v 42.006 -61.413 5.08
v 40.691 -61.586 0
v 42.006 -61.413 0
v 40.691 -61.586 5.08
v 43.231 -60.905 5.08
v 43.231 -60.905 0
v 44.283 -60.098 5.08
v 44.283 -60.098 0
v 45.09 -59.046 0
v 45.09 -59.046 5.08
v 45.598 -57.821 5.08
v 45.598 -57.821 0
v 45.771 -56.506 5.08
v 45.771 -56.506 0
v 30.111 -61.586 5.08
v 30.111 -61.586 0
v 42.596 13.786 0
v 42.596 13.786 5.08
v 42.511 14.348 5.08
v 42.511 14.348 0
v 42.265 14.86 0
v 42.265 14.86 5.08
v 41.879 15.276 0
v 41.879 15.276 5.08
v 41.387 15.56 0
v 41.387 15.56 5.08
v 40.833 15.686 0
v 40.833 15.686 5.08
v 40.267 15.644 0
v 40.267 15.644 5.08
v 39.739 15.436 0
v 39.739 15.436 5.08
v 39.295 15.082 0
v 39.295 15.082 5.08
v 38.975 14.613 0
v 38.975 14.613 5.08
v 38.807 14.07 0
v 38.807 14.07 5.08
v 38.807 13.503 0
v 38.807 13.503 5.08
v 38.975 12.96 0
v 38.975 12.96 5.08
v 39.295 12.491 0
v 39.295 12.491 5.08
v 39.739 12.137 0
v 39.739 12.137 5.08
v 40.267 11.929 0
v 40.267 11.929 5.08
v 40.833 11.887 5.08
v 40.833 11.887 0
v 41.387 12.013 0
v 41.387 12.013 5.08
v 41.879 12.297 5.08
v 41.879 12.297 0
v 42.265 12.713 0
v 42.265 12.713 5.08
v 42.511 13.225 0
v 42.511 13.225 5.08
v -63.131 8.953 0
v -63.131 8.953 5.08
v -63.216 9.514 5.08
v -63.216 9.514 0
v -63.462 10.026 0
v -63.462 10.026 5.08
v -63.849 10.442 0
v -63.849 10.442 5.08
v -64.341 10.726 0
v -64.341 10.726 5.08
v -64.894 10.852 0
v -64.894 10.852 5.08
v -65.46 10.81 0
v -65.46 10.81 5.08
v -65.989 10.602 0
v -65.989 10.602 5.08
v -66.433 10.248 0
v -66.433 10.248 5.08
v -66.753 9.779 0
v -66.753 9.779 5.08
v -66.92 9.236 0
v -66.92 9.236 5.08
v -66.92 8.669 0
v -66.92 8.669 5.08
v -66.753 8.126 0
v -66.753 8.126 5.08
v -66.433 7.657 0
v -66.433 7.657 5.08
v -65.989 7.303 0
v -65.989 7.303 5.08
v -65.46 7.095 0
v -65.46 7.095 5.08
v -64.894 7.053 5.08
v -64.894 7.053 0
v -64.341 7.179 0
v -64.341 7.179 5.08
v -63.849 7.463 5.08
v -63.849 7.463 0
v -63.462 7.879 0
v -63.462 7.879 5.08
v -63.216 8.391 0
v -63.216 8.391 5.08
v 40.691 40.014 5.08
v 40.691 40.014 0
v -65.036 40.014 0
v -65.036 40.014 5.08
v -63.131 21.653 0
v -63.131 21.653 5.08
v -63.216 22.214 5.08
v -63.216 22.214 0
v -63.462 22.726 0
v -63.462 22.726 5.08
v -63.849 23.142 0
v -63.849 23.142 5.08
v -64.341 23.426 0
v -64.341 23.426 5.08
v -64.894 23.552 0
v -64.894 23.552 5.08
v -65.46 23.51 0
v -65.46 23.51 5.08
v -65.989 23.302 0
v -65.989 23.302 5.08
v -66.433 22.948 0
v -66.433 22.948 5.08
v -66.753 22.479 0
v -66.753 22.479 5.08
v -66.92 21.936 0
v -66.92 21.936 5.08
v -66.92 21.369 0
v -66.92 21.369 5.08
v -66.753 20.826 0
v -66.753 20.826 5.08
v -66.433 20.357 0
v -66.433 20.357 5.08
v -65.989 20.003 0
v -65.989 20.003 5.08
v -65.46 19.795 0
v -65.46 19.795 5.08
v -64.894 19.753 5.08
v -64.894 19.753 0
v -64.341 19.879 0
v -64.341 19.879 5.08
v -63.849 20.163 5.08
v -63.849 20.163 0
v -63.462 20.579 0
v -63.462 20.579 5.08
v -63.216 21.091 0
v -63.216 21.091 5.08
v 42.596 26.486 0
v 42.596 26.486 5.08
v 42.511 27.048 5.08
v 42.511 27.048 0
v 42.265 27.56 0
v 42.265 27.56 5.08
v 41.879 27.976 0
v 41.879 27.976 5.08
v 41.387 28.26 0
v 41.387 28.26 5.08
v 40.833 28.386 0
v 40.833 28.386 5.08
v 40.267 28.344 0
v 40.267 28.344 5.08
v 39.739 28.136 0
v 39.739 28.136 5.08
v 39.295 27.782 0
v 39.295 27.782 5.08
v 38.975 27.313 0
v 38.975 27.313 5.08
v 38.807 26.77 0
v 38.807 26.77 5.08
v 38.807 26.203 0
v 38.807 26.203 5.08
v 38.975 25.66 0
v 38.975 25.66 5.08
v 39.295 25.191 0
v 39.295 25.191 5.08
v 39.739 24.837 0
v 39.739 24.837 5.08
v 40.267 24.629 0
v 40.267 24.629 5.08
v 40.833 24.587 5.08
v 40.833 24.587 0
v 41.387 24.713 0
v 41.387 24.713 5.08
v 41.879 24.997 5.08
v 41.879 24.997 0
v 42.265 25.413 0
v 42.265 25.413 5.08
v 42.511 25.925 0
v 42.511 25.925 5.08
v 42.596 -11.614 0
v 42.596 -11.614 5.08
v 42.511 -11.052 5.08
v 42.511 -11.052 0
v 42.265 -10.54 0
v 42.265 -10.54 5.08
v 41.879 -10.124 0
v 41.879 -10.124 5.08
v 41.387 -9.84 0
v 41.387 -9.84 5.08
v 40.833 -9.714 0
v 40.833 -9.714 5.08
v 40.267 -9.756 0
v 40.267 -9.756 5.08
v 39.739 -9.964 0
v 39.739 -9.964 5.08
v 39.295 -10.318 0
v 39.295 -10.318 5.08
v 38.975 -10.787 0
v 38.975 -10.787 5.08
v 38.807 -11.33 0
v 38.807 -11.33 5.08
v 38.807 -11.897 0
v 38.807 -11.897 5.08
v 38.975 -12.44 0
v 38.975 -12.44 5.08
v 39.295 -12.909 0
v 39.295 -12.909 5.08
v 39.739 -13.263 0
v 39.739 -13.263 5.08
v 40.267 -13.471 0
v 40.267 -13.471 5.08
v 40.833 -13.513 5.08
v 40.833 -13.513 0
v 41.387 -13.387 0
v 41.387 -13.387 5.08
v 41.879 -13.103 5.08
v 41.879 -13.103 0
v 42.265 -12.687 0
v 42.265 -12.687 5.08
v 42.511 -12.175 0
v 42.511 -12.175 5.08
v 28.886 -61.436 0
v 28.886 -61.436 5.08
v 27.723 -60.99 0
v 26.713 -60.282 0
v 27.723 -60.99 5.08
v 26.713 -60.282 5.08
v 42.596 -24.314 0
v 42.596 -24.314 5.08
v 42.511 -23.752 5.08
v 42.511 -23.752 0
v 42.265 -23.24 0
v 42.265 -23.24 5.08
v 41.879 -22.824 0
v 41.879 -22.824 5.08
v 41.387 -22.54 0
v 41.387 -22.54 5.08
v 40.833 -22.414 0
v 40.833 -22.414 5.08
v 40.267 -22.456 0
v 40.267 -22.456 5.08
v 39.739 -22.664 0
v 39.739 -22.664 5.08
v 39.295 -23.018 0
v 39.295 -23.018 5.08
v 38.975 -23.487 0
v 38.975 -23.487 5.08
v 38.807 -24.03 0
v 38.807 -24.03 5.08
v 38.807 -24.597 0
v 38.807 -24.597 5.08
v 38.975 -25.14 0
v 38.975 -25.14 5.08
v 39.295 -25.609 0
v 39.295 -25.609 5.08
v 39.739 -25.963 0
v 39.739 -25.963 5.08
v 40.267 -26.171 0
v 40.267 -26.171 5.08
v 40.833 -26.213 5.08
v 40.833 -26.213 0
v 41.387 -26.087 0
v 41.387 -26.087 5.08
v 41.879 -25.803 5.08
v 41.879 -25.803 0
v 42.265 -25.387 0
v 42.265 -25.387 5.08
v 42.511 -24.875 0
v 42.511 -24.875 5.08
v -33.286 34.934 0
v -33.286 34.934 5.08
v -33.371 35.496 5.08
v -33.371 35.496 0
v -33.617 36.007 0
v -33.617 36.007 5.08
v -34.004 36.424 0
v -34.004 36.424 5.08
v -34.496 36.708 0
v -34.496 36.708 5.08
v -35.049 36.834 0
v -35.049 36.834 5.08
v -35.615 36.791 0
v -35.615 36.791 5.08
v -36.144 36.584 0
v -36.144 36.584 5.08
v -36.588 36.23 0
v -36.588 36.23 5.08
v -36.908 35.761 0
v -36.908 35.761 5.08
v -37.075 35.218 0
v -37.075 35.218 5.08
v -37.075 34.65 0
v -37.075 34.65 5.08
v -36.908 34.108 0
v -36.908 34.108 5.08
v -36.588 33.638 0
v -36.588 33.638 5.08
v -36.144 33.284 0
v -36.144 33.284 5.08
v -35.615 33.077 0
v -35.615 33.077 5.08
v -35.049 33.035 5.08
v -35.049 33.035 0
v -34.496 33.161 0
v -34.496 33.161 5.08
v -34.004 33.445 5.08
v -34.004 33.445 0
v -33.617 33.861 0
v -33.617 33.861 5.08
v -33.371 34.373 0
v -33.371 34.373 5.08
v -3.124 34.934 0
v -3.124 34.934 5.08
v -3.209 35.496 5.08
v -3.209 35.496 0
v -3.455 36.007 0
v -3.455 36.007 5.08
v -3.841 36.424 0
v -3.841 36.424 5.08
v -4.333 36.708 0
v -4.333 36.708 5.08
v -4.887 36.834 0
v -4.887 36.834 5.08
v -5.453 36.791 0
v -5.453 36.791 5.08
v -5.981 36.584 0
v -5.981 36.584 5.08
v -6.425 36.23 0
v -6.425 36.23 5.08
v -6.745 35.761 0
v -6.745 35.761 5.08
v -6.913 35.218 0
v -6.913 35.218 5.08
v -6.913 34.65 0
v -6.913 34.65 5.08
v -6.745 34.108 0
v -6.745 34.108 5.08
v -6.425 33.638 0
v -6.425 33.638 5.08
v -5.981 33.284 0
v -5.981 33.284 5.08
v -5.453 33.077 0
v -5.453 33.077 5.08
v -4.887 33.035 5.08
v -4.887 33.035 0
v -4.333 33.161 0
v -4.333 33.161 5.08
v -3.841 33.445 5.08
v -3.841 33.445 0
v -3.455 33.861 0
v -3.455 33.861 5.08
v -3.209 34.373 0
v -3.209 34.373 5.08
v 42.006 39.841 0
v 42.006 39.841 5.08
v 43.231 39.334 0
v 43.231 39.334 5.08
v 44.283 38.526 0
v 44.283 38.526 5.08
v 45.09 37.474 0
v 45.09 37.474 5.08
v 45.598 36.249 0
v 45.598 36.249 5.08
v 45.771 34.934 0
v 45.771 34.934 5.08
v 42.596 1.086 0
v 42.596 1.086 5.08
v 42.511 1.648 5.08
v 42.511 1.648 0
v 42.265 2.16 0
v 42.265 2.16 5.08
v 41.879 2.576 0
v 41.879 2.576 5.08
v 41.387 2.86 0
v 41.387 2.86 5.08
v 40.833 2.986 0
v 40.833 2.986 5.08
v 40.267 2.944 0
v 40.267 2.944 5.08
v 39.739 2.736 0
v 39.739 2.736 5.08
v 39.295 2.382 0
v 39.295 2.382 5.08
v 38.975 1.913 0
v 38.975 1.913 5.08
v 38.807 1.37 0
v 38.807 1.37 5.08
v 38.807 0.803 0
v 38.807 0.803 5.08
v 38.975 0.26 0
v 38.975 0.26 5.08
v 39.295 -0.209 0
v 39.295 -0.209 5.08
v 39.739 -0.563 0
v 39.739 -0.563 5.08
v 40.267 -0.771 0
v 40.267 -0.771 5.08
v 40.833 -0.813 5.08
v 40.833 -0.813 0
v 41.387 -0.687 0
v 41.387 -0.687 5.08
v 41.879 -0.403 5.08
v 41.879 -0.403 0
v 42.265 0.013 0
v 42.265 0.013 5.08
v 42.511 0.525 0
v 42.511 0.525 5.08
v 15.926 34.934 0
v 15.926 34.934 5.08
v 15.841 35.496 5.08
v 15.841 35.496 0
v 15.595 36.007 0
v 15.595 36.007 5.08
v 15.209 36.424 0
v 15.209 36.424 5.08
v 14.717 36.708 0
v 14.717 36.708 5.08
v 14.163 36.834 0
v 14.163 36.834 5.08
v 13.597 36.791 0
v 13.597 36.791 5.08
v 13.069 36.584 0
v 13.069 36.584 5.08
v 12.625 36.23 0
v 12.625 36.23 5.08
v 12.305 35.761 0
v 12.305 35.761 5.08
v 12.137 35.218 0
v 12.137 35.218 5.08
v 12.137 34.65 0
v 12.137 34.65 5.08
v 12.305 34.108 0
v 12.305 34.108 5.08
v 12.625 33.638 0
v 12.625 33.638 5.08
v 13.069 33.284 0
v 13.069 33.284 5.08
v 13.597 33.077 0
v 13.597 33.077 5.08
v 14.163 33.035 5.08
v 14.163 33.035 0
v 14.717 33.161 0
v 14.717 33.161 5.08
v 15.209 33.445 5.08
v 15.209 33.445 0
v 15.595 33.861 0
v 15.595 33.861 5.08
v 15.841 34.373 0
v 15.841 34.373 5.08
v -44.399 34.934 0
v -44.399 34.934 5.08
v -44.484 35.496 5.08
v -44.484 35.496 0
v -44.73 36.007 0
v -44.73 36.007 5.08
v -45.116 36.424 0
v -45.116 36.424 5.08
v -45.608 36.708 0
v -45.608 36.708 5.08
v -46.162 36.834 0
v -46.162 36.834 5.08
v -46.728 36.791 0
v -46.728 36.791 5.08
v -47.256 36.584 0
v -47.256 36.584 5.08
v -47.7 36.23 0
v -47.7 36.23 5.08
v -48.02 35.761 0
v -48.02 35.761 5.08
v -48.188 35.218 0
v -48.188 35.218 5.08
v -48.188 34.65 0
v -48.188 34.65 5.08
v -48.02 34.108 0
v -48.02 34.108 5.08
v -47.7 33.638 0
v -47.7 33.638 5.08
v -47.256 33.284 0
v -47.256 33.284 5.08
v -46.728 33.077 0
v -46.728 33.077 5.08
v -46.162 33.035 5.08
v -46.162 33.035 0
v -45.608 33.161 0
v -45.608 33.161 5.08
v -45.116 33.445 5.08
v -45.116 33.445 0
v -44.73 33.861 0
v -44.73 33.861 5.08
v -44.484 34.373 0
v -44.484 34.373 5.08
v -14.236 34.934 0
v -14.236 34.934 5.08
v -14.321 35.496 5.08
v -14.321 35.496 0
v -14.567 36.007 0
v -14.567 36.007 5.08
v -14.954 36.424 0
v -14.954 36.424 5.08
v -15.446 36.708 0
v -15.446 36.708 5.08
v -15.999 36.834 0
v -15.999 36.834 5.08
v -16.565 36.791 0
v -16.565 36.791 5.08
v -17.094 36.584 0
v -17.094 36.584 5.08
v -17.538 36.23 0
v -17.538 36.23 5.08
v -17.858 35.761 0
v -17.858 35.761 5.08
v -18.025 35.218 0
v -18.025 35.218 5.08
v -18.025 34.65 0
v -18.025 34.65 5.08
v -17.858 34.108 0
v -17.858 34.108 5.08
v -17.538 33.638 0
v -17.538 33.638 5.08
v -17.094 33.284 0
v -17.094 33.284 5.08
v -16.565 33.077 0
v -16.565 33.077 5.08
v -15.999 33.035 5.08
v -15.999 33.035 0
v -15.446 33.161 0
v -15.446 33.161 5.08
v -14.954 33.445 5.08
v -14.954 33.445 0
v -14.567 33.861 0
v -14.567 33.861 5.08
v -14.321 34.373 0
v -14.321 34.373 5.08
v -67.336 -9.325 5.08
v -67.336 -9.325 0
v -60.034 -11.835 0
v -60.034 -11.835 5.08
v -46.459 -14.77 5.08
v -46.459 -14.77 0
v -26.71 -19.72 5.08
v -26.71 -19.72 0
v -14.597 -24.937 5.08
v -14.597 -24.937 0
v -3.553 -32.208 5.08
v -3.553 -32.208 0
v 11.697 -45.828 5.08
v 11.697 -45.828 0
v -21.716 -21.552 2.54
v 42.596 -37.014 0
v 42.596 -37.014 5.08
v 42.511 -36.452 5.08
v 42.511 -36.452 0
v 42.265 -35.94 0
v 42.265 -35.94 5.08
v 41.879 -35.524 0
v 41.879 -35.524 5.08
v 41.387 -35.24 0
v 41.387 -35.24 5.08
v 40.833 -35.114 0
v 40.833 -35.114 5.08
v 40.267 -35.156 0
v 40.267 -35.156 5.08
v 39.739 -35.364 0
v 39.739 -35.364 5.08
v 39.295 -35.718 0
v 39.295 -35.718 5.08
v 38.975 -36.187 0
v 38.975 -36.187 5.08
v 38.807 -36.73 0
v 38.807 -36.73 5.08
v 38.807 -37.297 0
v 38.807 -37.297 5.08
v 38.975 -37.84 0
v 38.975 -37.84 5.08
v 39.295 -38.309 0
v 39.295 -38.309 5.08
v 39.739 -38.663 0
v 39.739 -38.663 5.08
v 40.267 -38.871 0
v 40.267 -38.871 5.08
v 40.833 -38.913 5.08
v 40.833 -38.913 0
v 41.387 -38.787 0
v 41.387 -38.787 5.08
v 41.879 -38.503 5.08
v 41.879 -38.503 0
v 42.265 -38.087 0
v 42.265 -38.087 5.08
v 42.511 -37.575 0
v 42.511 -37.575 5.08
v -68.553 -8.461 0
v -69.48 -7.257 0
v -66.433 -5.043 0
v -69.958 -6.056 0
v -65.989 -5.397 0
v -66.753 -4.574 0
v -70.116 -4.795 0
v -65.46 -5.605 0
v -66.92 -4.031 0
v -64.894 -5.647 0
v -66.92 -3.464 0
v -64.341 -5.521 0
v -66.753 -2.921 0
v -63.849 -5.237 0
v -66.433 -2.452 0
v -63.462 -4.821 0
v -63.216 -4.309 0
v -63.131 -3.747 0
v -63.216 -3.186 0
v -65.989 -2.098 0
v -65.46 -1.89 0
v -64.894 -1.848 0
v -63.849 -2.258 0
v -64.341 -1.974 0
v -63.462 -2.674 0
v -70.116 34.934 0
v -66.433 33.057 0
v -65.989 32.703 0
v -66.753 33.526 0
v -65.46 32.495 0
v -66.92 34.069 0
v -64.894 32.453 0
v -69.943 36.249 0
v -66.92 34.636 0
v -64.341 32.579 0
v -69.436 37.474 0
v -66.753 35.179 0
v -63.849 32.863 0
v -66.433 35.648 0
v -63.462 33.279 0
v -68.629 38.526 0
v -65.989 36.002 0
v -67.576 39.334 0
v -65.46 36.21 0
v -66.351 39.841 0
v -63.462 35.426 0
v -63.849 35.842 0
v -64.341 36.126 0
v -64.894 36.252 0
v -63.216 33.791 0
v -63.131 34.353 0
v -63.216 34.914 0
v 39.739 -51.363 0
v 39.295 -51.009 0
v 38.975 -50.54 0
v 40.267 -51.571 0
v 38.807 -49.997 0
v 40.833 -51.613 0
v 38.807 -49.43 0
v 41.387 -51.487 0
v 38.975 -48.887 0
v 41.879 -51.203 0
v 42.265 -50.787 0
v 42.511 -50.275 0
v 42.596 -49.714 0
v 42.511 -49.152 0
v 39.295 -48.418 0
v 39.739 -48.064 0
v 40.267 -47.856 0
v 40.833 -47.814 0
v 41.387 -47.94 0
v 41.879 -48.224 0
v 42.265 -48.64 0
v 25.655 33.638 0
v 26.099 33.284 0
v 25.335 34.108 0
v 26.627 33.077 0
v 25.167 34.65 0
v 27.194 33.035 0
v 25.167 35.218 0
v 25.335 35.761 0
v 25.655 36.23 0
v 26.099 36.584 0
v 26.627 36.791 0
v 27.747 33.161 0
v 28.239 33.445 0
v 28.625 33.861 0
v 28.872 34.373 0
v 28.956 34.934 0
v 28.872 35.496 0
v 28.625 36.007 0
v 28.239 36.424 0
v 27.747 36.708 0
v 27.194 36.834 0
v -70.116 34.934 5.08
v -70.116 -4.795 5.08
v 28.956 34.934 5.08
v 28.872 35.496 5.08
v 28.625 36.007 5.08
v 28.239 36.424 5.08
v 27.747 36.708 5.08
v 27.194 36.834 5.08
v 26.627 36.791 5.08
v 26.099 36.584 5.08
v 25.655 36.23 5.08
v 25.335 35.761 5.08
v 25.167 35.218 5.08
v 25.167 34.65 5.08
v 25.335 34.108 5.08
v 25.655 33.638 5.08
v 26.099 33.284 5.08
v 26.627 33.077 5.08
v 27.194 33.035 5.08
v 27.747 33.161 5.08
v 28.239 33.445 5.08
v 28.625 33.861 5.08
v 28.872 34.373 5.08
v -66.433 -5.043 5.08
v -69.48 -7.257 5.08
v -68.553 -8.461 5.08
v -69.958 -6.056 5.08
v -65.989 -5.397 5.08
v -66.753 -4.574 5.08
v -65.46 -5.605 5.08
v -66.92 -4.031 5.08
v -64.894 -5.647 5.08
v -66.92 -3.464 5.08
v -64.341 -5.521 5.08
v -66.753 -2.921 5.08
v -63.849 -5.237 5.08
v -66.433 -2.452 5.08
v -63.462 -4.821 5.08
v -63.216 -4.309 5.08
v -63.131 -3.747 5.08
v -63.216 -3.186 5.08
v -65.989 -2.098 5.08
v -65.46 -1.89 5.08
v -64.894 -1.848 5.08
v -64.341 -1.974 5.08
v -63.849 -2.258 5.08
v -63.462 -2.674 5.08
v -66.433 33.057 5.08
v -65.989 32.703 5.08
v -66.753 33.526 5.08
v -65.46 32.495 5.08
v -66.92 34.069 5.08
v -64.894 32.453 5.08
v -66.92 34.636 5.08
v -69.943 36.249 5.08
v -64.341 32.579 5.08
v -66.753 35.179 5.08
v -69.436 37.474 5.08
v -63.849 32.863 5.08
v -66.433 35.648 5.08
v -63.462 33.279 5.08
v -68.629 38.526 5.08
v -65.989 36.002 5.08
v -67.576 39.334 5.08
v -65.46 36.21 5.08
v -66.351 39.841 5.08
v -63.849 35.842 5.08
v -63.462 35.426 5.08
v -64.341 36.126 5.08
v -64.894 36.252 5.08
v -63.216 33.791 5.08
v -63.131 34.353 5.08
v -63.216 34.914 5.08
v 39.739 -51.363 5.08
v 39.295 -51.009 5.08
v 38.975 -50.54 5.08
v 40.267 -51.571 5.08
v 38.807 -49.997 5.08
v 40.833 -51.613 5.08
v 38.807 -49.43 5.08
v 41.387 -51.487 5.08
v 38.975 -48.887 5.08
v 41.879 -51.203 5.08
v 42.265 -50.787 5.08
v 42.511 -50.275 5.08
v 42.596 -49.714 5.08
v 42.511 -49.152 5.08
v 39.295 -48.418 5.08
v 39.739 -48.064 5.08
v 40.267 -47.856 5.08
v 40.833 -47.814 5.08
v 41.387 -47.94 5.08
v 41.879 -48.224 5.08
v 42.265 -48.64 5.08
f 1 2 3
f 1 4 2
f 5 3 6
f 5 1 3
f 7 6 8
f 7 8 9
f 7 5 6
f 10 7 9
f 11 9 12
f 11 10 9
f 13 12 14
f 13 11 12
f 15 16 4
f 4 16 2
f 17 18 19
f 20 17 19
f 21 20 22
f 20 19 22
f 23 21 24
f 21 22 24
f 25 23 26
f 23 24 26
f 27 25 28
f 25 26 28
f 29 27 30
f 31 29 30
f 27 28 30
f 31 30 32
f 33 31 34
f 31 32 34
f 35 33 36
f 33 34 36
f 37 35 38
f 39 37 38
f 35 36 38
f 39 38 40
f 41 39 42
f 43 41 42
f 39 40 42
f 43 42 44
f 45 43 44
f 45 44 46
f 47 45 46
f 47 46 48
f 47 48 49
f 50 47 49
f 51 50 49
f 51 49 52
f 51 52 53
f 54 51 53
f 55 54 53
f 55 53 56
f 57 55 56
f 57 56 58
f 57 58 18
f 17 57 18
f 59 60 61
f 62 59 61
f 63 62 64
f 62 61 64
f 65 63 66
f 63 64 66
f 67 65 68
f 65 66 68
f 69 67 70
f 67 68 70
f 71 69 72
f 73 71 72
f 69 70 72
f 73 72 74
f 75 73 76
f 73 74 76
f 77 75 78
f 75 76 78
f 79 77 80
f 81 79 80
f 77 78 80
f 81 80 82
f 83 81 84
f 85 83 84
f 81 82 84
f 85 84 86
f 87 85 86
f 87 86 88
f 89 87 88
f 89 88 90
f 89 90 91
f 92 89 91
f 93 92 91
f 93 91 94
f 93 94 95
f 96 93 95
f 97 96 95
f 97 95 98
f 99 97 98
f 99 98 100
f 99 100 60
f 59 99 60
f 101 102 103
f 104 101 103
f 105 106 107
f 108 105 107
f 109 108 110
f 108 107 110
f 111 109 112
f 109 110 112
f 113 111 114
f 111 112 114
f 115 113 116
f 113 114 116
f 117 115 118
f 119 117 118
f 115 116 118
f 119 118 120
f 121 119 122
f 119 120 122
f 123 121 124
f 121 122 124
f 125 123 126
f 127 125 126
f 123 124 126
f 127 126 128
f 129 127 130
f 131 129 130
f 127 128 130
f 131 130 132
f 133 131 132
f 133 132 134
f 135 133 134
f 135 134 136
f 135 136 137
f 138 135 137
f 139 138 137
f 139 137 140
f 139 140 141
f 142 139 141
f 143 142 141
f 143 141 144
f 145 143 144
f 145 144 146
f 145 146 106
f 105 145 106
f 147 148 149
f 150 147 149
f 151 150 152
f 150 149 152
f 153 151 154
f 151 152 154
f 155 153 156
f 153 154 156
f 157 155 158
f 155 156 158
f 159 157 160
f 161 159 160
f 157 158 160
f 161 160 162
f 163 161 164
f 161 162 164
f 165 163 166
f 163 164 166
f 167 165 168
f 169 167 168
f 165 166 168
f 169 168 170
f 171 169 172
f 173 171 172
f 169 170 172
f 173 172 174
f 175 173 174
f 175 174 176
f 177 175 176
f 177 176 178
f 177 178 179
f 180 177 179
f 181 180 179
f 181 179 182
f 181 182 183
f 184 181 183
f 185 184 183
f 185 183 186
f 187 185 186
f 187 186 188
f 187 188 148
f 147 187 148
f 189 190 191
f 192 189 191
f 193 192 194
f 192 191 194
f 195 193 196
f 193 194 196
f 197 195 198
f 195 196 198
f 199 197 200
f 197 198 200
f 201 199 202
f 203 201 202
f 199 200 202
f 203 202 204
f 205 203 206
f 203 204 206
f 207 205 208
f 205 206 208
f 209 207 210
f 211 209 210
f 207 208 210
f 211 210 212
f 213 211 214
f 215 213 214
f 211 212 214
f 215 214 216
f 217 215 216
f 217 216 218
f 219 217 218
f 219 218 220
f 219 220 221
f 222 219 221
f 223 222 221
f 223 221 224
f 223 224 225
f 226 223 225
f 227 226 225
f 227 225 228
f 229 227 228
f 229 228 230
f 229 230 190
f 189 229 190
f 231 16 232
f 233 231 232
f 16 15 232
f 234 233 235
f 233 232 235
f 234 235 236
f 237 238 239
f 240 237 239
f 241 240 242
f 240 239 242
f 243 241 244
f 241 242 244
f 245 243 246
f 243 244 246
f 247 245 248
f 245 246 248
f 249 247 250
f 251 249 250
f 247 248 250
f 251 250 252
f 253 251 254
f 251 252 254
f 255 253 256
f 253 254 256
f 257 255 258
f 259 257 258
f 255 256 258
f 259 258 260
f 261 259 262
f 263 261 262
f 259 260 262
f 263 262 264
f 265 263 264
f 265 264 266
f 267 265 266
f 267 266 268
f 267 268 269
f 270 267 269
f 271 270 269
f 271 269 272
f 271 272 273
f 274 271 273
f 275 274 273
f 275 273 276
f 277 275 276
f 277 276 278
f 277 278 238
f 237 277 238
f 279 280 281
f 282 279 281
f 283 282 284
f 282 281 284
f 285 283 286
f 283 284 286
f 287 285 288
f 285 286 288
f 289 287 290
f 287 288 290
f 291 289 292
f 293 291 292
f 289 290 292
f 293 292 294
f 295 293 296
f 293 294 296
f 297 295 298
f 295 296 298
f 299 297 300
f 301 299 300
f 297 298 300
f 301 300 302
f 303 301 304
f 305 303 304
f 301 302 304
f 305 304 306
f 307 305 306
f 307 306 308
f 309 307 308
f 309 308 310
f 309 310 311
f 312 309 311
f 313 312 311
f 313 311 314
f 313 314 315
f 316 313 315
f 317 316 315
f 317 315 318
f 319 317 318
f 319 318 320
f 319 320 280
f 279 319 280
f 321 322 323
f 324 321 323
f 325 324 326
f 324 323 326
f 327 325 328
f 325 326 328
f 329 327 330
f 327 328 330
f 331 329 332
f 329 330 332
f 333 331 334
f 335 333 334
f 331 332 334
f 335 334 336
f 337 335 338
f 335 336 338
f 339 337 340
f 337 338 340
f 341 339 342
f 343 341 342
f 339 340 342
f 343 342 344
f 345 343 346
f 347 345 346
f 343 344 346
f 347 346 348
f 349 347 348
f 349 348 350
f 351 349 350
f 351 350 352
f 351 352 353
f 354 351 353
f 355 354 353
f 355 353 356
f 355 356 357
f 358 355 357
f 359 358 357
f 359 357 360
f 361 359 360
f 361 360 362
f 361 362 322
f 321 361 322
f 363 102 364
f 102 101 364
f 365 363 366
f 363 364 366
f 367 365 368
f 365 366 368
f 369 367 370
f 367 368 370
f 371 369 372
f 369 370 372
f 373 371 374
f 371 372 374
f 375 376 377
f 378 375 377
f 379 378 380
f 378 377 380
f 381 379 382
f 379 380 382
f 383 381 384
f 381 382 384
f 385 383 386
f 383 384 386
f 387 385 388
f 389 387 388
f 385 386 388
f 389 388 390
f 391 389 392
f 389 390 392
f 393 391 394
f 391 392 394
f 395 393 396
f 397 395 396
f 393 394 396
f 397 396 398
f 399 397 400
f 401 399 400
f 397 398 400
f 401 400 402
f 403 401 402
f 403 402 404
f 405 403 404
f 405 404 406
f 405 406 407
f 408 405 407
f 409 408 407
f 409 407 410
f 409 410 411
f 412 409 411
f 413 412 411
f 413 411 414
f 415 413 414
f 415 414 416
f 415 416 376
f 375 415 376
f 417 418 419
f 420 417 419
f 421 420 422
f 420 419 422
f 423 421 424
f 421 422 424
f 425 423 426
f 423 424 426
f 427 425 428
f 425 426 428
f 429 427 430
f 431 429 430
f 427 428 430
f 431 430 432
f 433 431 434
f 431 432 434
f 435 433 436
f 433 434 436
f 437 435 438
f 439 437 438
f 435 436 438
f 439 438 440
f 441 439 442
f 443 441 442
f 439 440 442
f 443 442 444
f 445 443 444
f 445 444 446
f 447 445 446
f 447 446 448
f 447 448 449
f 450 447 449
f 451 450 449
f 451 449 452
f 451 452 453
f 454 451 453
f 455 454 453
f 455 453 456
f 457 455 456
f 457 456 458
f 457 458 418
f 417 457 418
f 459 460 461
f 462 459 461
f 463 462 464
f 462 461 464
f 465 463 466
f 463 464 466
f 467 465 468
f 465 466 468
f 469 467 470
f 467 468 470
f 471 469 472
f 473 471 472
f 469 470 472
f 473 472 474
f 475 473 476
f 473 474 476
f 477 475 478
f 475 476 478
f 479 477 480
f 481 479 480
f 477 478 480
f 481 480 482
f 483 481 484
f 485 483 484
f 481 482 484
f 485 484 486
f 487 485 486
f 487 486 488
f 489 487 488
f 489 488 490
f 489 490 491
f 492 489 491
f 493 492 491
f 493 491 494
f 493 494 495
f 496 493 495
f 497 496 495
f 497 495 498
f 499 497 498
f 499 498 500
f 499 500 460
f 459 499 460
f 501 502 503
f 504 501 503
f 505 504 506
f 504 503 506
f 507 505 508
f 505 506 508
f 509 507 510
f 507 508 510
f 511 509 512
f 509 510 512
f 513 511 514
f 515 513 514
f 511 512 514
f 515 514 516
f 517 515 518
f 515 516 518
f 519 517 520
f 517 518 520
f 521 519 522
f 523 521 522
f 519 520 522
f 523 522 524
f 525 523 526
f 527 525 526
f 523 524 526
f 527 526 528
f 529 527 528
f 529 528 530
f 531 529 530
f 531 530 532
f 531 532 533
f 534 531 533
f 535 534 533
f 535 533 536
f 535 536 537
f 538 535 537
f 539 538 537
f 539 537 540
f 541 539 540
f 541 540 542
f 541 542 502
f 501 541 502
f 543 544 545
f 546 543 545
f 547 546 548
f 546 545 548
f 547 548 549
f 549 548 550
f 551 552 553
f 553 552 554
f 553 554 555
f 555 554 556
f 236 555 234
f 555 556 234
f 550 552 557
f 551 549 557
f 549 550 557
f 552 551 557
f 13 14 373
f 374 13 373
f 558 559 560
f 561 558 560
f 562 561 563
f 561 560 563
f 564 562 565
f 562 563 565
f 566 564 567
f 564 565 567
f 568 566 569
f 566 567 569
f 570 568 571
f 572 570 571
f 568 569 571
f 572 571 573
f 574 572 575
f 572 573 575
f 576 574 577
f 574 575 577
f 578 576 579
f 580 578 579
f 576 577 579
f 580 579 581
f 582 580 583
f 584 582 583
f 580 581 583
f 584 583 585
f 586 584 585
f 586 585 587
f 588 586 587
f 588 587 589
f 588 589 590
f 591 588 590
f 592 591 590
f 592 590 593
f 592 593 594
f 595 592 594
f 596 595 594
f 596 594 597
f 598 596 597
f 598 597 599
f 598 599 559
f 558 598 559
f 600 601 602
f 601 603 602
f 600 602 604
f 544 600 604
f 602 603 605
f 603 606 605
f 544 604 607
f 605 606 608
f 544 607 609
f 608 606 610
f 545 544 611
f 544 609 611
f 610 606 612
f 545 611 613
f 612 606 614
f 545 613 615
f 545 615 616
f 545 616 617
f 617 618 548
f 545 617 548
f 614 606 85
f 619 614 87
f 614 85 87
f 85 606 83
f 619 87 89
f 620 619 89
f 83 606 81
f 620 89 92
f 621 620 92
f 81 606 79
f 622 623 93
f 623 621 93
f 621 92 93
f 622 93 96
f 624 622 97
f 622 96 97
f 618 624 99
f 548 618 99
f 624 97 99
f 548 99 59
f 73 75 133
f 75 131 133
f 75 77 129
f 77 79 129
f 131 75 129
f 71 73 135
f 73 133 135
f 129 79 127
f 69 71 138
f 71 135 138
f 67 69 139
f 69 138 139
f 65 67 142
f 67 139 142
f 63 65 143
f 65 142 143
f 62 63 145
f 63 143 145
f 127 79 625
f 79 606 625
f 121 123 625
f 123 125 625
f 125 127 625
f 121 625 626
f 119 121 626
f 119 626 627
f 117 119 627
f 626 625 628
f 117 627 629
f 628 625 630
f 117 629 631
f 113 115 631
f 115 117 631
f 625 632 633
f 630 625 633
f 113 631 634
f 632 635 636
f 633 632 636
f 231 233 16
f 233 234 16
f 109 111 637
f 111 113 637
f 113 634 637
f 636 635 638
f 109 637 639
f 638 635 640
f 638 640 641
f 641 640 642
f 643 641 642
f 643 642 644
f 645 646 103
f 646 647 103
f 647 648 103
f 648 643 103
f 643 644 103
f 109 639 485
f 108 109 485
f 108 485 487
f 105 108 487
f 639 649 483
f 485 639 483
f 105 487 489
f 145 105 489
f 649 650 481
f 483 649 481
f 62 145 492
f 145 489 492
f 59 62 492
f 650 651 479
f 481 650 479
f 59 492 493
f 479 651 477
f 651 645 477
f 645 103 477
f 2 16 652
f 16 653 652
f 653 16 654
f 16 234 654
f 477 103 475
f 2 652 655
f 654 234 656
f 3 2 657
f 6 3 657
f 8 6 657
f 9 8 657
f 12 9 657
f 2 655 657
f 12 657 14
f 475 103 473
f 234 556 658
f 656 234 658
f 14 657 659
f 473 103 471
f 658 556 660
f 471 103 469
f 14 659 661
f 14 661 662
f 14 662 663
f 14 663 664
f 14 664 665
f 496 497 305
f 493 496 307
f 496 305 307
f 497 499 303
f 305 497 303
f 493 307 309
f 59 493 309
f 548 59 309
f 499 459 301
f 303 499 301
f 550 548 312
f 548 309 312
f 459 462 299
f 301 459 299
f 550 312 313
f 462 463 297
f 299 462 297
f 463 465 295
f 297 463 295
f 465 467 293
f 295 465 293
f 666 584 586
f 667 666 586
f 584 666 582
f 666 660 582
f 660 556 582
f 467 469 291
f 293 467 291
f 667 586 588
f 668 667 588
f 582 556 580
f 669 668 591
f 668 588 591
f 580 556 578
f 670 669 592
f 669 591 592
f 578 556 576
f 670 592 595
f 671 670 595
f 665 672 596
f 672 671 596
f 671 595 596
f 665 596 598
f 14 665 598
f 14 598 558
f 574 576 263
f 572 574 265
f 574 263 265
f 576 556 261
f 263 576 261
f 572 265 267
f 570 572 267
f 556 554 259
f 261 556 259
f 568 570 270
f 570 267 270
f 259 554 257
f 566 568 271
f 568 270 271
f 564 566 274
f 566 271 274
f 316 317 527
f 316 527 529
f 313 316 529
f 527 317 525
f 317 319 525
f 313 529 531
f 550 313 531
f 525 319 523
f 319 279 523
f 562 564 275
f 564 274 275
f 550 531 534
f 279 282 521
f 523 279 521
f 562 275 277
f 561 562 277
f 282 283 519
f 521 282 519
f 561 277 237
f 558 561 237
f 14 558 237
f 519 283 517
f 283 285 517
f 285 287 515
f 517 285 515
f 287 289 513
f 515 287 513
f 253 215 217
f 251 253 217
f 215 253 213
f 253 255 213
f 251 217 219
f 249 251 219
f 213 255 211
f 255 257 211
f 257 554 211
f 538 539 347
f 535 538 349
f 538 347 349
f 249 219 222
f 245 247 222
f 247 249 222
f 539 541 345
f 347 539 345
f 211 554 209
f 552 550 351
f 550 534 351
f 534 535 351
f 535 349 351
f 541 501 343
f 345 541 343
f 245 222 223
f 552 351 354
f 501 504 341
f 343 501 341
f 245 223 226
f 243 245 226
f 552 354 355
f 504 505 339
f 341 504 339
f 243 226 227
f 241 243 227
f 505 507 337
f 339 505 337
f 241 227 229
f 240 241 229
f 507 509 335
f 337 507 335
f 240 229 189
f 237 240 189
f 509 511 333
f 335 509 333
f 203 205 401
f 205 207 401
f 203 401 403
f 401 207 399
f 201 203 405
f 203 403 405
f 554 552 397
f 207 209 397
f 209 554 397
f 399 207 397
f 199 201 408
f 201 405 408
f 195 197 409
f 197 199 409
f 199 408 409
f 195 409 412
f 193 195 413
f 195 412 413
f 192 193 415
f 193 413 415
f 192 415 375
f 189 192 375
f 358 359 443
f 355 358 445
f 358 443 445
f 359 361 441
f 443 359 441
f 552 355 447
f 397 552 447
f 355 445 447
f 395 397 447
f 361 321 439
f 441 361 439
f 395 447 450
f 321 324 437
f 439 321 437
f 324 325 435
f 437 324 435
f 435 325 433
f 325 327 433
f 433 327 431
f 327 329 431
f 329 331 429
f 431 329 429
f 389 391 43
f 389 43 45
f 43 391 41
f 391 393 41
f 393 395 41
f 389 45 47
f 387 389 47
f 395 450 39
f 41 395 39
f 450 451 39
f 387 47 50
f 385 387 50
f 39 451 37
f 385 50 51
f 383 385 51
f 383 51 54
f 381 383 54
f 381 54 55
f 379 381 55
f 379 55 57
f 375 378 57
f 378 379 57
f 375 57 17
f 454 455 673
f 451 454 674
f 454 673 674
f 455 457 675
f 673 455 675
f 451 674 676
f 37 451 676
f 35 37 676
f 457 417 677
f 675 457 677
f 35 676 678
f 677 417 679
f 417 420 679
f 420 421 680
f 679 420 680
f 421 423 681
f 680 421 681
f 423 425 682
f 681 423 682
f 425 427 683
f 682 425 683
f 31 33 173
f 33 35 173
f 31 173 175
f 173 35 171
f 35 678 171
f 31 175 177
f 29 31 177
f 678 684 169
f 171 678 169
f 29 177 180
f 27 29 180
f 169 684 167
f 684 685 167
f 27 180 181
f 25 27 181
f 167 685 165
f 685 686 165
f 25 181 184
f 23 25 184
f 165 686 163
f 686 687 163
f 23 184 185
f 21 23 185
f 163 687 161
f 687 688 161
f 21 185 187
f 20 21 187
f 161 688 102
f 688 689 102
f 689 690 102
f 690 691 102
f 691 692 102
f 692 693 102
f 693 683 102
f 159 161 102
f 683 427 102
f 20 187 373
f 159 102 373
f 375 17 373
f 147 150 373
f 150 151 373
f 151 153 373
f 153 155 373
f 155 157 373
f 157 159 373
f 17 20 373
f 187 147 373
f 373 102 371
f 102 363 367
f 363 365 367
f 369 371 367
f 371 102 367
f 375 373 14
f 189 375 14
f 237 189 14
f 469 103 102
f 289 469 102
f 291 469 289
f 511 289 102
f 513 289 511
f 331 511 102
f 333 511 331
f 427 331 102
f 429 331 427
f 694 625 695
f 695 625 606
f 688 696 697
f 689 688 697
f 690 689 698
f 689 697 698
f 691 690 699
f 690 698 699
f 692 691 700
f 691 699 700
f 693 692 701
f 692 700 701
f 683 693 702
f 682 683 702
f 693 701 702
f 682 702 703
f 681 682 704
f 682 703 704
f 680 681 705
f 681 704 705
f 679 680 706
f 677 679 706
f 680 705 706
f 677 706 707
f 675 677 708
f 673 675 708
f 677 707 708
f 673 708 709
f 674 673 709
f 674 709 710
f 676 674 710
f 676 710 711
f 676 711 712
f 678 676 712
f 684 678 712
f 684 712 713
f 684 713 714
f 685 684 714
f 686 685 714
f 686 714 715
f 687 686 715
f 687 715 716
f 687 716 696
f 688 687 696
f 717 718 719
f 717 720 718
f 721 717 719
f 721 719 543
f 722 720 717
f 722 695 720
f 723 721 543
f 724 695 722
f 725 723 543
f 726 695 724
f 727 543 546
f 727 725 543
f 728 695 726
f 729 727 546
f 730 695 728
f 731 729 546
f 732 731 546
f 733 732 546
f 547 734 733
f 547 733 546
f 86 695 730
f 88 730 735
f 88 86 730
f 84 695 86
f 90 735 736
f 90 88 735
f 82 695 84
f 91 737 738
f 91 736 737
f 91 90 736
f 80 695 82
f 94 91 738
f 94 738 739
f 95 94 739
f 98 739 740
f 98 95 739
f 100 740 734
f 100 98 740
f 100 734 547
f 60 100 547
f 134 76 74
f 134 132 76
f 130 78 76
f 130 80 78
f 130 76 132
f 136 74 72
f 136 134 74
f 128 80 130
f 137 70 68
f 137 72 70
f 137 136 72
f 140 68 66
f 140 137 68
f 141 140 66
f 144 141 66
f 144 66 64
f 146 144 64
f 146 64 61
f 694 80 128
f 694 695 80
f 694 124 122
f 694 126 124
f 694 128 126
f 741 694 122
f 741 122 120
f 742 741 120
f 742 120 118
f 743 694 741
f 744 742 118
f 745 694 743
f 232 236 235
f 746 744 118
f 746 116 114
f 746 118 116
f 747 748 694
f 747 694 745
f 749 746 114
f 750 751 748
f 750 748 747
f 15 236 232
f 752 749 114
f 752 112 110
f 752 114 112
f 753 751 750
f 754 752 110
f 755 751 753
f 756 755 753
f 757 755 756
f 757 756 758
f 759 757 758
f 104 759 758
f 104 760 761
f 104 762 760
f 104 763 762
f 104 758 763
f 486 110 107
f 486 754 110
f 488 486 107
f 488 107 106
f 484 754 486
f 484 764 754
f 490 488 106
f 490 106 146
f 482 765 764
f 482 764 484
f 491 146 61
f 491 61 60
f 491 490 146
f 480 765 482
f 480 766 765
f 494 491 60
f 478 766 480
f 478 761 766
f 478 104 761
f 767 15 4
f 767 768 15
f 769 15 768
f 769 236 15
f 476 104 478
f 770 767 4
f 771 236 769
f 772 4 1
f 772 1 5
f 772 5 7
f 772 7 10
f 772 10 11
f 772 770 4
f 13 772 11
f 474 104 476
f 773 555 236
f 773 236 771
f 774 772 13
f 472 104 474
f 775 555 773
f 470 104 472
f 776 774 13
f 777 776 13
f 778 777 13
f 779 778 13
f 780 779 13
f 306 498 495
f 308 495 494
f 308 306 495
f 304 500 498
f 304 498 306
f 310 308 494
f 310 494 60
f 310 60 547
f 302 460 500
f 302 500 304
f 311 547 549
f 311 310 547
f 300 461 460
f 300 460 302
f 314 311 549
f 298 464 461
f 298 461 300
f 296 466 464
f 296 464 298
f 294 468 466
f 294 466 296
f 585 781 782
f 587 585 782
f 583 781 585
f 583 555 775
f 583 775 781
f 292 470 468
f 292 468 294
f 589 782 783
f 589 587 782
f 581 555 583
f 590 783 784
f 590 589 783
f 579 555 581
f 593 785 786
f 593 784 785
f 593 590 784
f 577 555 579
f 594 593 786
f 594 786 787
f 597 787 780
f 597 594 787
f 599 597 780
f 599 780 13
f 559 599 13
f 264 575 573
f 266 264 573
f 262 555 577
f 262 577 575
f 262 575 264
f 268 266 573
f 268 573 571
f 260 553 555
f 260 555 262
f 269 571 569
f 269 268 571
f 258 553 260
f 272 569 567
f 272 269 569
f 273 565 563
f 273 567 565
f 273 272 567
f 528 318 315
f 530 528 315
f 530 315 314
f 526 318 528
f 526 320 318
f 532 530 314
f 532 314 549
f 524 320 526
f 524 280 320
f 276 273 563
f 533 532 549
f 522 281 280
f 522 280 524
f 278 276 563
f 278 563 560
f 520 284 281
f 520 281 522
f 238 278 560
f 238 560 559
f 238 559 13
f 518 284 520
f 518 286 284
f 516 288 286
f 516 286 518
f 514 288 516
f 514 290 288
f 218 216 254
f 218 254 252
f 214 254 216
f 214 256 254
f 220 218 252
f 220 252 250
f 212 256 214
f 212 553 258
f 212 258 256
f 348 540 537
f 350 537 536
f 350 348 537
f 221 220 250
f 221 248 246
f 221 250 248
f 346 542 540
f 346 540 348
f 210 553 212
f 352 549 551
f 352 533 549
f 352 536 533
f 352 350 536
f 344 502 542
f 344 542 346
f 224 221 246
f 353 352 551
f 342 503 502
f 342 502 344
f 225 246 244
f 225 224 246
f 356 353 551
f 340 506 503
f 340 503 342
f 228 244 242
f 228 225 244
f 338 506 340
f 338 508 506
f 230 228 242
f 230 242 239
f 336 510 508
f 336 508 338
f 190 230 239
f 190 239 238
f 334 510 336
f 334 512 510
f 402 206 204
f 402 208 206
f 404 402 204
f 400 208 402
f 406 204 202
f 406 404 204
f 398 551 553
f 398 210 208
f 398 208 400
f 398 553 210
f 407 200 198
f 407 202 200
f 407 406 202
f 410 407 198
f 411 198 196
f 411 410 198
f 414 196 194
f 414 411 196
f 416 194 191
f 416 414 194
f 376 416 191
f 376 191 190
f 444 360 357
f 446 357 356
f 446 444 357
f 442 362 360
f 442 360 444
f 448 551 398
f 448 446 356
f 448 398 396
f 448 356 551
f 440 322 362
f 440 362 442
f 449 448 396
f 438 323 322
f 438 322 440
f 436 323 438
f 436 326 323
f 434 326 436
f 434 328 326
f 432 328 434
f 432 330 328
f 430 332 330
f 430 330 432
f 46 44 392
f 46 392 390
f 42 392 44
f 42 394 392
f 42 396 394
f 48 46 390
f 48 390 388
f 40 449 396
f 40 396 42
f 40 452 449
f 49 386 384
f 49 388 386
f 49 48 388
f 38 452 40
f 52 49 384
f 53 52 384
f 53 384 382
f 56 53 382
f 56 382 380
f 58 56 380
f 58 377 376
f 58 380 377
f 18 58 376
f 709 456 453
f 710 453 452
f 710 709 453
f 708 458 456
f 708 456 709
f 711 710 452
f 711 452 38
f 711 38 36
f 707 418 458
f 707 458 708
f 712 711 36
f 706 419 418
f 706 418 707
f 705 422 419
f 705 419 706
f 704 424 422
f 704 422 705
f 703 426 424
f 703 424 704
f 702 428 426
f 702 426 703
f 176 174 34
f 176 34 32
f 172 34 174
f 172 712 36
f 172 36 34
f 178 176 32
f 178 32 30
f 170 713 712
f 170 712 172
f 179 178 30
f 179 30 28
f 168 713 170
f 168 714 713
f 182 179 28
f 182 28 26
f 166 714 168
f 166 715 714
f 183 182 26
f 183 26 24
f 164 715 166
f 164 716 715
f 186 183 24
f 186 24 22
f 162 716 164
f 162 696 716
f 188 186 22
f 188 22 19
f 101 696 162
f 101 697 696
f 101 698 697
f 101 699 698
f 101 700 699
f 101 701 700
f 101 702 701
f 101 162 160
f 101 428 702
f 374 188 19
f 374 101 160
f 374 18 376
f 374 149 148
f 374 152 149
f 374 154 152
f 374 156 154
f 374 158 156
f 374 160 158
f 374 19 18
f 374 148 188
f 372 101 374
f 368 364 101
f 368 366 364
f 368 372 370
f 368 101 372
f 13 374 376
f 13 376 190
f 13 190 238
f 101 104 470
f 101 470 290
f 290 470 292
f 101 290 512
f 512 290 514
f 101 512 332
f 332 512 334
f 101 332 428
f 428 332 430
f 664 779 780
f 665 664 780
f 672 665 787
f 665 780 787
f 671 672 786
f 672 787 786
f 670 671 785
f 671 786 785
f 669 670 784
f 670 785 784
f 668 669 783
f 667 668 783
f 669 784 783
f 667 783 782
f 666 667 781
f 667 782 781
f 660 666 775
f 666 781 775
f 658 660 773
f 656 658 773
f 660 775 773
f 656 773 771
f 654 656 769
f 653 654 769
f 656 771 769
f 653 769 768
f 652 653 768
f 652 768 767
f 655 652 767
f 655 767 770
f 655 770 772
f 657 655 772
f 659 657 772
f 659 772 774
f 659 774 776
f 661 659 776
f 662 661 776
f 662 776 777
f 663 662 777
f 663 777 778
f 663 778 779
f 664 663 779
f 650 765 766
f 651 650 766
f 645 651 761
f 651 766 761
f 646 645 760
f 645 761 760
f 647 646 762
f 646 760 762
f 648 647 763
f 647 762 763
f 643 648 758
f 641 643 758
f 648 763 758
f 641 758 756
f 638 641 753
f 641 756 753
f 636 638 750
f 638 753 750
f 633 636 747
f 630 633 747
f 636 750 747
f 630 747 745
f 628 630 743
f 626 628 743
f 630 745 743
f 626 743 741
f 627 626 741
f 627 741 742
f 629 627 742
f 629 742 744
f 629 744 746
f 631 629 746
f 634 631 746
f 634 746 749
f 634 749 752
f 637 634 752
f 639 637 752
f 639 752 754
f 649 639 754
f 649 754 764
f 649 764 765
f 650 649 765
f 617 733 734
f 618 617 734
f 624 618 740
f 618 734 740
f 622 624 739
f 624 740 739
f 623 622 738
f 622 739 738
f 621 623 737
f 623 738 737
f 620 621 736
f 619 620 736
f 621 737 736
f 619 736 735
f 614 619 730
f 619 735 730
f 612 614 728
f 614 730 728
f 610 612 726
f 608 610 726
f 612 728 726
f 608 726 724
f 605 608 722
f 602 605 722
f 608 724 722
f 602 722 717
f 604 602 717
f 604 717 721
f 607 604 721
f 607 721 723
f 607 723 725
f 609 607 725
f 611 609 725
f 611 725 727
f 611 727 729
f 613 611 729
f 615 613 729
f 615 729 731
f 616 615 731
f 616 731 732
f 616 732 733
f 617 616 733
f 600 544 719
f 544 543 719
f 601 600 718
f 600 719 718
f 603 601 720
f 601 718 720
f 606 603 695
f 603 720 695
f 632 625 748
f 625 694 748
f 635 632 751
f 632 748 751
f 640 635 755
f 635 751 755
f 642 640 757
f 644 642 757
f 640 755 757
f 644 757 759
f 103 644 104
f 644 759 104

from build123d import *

# Parameters (mm, degrees)
F1_DEPTH = 5.08
F2_R     = 5.08
F2_R_2   = 5.07999
F3_R     = 1.905
F4_DEPTH = 5.0810001


# Not quite as in the source:
# - a fillet or chamfer is up to 0.001 mm smaller than in the source, because OpenCascade refuses the exact size


with BuildPart() as f1:
    # F0 (on Top) → F1 (new body)
    with BuildSketch(Plane.XY):
        with BuildLine():
            Line((-70.1164795637, 40.014226675), (-70.1164795637, -7.2926129862))
            add(Edge.make_bspline(
                [(-70.1164795637, -7.2926129862), (-65.04872861, -13.3058879533), (-12.1612328693, -14.8475963345), (11.7038576667, -47.1047081721), (28.178319335, -61.585773325)],
                knots=[0, 0, 0, 0, 0.4703732395, 1, 1, 1, 1], degree=3))
            Line((28.178319335, -61.585773325), (45.7710204363, -61.585773325))
            Line((45.7710204363, -61.585773325), (45.7710204363, 40.014226675))
            Line((45.7710204363, 40.014226675), (-70.1164795637, 40.014226675))
        make_face()
    extrude(amount=F1_DEPTH)

    # F2 (call 1 of 5: OpenCascade refuses the feature's edges together)
    f2_edges = [f1.edges().sort_by_distance(p)[0] for p in [
        (-70.11648, 40.014227, 2.54),
    ]]
    fillet(f2_edges, radius=F2_R)

    # F2#2 (call 2 of 5)
    f2_2_edges = [f1.edges().sort_by_distance(p)[0] for p in [
        (45.77102, 40.014227, 2.54),
    ]]
    fillet(f2_2_edges, radius=F2_R)

    # F2#4 (call 3 of 5)
    f2_4_edges = [f1.edges().sort_by_distance(p)[0] for p in [
        (28.178319, -61.585773, 2.54),
    ]]
    fillet(f2_4_edges, radius=F2_R)

    # F2#5 (call 4 of 5)
    f2_5_edges = [f1.edges().sort_by_distance(p)[0] for p in [
        (45.77102, -61.585773, 2.54),
    ]]
    fillet(f2_5_edges, radius=F2_R)

    # F2#3 (call 5 of 5) (radius 5.08 in the source; OpenCascade refuses exactly that, so slightly less here)
    f2_3_edges = [f1.edges().sort_by_distance(p)[0] for p in [
        (-70.11648, -7.292613, 2.54),
    ]]
    fillet(f2_3_edges, radius=F2_R_2)

    # F3 (on face) → F4 (cut, through all)
    with BuildSketch(Plane.XY.offset(5.08)):
        with Locations((-46.3039795637, 34.934226675)):
            Circle(F3_R)
        with Locations((-35.1914795637, 34.934226675)):
            Circle(F3_R)
        with Locations((-16.1414795637, 34.934226675)):
            Circle(F3_R)
        with Locations((-5.0289795637, 34.934226675)):
            Circle(F3_R)
        with Locations((14.0210204363, 34.934226675)):
            Circle(F3_R)
        with Locations((-65.0364795637, 34.3525031737)):
            Circle(F3_R)
        with Locations((-65.0364795637, 21.6525031737)):
            Circle(F3_R)
        with Locations((-65.0364795637, 8.9525031737)):
            Circle(F3_R)
        with Locations((-65.0364795637, -3.7474968263)):
            Circle(F3_R)
        with Locations((27.0512204363, 34.934226675)):
            Circle(F3_R)
        with Locations((40.6910204363, 26.4864852548)):
            Circle(F3_R)
        with Locations((40.6910204363, 13.7864852548)):
            Circle(F3_R)
        with Locations((40.6910204363, 1.0864852548)):
            Circle(F3_R)
        with Locations((40.6910204363, -11.6135147452)):
            Circle(F3_R)
        with Locations((40.6910204363, -24.3135147452)):
            Circle(F3_R)
        with Locations((40.6910204363, -37.0135147452)):
            Circle(F3_R)
        with Locations((40.6910204363, -49.7135147452)):
            Circle(F3_R)
    extrude(amount=-F4_DEPTH, mode=Mode.SUBTRACT)


solid = f1.part
